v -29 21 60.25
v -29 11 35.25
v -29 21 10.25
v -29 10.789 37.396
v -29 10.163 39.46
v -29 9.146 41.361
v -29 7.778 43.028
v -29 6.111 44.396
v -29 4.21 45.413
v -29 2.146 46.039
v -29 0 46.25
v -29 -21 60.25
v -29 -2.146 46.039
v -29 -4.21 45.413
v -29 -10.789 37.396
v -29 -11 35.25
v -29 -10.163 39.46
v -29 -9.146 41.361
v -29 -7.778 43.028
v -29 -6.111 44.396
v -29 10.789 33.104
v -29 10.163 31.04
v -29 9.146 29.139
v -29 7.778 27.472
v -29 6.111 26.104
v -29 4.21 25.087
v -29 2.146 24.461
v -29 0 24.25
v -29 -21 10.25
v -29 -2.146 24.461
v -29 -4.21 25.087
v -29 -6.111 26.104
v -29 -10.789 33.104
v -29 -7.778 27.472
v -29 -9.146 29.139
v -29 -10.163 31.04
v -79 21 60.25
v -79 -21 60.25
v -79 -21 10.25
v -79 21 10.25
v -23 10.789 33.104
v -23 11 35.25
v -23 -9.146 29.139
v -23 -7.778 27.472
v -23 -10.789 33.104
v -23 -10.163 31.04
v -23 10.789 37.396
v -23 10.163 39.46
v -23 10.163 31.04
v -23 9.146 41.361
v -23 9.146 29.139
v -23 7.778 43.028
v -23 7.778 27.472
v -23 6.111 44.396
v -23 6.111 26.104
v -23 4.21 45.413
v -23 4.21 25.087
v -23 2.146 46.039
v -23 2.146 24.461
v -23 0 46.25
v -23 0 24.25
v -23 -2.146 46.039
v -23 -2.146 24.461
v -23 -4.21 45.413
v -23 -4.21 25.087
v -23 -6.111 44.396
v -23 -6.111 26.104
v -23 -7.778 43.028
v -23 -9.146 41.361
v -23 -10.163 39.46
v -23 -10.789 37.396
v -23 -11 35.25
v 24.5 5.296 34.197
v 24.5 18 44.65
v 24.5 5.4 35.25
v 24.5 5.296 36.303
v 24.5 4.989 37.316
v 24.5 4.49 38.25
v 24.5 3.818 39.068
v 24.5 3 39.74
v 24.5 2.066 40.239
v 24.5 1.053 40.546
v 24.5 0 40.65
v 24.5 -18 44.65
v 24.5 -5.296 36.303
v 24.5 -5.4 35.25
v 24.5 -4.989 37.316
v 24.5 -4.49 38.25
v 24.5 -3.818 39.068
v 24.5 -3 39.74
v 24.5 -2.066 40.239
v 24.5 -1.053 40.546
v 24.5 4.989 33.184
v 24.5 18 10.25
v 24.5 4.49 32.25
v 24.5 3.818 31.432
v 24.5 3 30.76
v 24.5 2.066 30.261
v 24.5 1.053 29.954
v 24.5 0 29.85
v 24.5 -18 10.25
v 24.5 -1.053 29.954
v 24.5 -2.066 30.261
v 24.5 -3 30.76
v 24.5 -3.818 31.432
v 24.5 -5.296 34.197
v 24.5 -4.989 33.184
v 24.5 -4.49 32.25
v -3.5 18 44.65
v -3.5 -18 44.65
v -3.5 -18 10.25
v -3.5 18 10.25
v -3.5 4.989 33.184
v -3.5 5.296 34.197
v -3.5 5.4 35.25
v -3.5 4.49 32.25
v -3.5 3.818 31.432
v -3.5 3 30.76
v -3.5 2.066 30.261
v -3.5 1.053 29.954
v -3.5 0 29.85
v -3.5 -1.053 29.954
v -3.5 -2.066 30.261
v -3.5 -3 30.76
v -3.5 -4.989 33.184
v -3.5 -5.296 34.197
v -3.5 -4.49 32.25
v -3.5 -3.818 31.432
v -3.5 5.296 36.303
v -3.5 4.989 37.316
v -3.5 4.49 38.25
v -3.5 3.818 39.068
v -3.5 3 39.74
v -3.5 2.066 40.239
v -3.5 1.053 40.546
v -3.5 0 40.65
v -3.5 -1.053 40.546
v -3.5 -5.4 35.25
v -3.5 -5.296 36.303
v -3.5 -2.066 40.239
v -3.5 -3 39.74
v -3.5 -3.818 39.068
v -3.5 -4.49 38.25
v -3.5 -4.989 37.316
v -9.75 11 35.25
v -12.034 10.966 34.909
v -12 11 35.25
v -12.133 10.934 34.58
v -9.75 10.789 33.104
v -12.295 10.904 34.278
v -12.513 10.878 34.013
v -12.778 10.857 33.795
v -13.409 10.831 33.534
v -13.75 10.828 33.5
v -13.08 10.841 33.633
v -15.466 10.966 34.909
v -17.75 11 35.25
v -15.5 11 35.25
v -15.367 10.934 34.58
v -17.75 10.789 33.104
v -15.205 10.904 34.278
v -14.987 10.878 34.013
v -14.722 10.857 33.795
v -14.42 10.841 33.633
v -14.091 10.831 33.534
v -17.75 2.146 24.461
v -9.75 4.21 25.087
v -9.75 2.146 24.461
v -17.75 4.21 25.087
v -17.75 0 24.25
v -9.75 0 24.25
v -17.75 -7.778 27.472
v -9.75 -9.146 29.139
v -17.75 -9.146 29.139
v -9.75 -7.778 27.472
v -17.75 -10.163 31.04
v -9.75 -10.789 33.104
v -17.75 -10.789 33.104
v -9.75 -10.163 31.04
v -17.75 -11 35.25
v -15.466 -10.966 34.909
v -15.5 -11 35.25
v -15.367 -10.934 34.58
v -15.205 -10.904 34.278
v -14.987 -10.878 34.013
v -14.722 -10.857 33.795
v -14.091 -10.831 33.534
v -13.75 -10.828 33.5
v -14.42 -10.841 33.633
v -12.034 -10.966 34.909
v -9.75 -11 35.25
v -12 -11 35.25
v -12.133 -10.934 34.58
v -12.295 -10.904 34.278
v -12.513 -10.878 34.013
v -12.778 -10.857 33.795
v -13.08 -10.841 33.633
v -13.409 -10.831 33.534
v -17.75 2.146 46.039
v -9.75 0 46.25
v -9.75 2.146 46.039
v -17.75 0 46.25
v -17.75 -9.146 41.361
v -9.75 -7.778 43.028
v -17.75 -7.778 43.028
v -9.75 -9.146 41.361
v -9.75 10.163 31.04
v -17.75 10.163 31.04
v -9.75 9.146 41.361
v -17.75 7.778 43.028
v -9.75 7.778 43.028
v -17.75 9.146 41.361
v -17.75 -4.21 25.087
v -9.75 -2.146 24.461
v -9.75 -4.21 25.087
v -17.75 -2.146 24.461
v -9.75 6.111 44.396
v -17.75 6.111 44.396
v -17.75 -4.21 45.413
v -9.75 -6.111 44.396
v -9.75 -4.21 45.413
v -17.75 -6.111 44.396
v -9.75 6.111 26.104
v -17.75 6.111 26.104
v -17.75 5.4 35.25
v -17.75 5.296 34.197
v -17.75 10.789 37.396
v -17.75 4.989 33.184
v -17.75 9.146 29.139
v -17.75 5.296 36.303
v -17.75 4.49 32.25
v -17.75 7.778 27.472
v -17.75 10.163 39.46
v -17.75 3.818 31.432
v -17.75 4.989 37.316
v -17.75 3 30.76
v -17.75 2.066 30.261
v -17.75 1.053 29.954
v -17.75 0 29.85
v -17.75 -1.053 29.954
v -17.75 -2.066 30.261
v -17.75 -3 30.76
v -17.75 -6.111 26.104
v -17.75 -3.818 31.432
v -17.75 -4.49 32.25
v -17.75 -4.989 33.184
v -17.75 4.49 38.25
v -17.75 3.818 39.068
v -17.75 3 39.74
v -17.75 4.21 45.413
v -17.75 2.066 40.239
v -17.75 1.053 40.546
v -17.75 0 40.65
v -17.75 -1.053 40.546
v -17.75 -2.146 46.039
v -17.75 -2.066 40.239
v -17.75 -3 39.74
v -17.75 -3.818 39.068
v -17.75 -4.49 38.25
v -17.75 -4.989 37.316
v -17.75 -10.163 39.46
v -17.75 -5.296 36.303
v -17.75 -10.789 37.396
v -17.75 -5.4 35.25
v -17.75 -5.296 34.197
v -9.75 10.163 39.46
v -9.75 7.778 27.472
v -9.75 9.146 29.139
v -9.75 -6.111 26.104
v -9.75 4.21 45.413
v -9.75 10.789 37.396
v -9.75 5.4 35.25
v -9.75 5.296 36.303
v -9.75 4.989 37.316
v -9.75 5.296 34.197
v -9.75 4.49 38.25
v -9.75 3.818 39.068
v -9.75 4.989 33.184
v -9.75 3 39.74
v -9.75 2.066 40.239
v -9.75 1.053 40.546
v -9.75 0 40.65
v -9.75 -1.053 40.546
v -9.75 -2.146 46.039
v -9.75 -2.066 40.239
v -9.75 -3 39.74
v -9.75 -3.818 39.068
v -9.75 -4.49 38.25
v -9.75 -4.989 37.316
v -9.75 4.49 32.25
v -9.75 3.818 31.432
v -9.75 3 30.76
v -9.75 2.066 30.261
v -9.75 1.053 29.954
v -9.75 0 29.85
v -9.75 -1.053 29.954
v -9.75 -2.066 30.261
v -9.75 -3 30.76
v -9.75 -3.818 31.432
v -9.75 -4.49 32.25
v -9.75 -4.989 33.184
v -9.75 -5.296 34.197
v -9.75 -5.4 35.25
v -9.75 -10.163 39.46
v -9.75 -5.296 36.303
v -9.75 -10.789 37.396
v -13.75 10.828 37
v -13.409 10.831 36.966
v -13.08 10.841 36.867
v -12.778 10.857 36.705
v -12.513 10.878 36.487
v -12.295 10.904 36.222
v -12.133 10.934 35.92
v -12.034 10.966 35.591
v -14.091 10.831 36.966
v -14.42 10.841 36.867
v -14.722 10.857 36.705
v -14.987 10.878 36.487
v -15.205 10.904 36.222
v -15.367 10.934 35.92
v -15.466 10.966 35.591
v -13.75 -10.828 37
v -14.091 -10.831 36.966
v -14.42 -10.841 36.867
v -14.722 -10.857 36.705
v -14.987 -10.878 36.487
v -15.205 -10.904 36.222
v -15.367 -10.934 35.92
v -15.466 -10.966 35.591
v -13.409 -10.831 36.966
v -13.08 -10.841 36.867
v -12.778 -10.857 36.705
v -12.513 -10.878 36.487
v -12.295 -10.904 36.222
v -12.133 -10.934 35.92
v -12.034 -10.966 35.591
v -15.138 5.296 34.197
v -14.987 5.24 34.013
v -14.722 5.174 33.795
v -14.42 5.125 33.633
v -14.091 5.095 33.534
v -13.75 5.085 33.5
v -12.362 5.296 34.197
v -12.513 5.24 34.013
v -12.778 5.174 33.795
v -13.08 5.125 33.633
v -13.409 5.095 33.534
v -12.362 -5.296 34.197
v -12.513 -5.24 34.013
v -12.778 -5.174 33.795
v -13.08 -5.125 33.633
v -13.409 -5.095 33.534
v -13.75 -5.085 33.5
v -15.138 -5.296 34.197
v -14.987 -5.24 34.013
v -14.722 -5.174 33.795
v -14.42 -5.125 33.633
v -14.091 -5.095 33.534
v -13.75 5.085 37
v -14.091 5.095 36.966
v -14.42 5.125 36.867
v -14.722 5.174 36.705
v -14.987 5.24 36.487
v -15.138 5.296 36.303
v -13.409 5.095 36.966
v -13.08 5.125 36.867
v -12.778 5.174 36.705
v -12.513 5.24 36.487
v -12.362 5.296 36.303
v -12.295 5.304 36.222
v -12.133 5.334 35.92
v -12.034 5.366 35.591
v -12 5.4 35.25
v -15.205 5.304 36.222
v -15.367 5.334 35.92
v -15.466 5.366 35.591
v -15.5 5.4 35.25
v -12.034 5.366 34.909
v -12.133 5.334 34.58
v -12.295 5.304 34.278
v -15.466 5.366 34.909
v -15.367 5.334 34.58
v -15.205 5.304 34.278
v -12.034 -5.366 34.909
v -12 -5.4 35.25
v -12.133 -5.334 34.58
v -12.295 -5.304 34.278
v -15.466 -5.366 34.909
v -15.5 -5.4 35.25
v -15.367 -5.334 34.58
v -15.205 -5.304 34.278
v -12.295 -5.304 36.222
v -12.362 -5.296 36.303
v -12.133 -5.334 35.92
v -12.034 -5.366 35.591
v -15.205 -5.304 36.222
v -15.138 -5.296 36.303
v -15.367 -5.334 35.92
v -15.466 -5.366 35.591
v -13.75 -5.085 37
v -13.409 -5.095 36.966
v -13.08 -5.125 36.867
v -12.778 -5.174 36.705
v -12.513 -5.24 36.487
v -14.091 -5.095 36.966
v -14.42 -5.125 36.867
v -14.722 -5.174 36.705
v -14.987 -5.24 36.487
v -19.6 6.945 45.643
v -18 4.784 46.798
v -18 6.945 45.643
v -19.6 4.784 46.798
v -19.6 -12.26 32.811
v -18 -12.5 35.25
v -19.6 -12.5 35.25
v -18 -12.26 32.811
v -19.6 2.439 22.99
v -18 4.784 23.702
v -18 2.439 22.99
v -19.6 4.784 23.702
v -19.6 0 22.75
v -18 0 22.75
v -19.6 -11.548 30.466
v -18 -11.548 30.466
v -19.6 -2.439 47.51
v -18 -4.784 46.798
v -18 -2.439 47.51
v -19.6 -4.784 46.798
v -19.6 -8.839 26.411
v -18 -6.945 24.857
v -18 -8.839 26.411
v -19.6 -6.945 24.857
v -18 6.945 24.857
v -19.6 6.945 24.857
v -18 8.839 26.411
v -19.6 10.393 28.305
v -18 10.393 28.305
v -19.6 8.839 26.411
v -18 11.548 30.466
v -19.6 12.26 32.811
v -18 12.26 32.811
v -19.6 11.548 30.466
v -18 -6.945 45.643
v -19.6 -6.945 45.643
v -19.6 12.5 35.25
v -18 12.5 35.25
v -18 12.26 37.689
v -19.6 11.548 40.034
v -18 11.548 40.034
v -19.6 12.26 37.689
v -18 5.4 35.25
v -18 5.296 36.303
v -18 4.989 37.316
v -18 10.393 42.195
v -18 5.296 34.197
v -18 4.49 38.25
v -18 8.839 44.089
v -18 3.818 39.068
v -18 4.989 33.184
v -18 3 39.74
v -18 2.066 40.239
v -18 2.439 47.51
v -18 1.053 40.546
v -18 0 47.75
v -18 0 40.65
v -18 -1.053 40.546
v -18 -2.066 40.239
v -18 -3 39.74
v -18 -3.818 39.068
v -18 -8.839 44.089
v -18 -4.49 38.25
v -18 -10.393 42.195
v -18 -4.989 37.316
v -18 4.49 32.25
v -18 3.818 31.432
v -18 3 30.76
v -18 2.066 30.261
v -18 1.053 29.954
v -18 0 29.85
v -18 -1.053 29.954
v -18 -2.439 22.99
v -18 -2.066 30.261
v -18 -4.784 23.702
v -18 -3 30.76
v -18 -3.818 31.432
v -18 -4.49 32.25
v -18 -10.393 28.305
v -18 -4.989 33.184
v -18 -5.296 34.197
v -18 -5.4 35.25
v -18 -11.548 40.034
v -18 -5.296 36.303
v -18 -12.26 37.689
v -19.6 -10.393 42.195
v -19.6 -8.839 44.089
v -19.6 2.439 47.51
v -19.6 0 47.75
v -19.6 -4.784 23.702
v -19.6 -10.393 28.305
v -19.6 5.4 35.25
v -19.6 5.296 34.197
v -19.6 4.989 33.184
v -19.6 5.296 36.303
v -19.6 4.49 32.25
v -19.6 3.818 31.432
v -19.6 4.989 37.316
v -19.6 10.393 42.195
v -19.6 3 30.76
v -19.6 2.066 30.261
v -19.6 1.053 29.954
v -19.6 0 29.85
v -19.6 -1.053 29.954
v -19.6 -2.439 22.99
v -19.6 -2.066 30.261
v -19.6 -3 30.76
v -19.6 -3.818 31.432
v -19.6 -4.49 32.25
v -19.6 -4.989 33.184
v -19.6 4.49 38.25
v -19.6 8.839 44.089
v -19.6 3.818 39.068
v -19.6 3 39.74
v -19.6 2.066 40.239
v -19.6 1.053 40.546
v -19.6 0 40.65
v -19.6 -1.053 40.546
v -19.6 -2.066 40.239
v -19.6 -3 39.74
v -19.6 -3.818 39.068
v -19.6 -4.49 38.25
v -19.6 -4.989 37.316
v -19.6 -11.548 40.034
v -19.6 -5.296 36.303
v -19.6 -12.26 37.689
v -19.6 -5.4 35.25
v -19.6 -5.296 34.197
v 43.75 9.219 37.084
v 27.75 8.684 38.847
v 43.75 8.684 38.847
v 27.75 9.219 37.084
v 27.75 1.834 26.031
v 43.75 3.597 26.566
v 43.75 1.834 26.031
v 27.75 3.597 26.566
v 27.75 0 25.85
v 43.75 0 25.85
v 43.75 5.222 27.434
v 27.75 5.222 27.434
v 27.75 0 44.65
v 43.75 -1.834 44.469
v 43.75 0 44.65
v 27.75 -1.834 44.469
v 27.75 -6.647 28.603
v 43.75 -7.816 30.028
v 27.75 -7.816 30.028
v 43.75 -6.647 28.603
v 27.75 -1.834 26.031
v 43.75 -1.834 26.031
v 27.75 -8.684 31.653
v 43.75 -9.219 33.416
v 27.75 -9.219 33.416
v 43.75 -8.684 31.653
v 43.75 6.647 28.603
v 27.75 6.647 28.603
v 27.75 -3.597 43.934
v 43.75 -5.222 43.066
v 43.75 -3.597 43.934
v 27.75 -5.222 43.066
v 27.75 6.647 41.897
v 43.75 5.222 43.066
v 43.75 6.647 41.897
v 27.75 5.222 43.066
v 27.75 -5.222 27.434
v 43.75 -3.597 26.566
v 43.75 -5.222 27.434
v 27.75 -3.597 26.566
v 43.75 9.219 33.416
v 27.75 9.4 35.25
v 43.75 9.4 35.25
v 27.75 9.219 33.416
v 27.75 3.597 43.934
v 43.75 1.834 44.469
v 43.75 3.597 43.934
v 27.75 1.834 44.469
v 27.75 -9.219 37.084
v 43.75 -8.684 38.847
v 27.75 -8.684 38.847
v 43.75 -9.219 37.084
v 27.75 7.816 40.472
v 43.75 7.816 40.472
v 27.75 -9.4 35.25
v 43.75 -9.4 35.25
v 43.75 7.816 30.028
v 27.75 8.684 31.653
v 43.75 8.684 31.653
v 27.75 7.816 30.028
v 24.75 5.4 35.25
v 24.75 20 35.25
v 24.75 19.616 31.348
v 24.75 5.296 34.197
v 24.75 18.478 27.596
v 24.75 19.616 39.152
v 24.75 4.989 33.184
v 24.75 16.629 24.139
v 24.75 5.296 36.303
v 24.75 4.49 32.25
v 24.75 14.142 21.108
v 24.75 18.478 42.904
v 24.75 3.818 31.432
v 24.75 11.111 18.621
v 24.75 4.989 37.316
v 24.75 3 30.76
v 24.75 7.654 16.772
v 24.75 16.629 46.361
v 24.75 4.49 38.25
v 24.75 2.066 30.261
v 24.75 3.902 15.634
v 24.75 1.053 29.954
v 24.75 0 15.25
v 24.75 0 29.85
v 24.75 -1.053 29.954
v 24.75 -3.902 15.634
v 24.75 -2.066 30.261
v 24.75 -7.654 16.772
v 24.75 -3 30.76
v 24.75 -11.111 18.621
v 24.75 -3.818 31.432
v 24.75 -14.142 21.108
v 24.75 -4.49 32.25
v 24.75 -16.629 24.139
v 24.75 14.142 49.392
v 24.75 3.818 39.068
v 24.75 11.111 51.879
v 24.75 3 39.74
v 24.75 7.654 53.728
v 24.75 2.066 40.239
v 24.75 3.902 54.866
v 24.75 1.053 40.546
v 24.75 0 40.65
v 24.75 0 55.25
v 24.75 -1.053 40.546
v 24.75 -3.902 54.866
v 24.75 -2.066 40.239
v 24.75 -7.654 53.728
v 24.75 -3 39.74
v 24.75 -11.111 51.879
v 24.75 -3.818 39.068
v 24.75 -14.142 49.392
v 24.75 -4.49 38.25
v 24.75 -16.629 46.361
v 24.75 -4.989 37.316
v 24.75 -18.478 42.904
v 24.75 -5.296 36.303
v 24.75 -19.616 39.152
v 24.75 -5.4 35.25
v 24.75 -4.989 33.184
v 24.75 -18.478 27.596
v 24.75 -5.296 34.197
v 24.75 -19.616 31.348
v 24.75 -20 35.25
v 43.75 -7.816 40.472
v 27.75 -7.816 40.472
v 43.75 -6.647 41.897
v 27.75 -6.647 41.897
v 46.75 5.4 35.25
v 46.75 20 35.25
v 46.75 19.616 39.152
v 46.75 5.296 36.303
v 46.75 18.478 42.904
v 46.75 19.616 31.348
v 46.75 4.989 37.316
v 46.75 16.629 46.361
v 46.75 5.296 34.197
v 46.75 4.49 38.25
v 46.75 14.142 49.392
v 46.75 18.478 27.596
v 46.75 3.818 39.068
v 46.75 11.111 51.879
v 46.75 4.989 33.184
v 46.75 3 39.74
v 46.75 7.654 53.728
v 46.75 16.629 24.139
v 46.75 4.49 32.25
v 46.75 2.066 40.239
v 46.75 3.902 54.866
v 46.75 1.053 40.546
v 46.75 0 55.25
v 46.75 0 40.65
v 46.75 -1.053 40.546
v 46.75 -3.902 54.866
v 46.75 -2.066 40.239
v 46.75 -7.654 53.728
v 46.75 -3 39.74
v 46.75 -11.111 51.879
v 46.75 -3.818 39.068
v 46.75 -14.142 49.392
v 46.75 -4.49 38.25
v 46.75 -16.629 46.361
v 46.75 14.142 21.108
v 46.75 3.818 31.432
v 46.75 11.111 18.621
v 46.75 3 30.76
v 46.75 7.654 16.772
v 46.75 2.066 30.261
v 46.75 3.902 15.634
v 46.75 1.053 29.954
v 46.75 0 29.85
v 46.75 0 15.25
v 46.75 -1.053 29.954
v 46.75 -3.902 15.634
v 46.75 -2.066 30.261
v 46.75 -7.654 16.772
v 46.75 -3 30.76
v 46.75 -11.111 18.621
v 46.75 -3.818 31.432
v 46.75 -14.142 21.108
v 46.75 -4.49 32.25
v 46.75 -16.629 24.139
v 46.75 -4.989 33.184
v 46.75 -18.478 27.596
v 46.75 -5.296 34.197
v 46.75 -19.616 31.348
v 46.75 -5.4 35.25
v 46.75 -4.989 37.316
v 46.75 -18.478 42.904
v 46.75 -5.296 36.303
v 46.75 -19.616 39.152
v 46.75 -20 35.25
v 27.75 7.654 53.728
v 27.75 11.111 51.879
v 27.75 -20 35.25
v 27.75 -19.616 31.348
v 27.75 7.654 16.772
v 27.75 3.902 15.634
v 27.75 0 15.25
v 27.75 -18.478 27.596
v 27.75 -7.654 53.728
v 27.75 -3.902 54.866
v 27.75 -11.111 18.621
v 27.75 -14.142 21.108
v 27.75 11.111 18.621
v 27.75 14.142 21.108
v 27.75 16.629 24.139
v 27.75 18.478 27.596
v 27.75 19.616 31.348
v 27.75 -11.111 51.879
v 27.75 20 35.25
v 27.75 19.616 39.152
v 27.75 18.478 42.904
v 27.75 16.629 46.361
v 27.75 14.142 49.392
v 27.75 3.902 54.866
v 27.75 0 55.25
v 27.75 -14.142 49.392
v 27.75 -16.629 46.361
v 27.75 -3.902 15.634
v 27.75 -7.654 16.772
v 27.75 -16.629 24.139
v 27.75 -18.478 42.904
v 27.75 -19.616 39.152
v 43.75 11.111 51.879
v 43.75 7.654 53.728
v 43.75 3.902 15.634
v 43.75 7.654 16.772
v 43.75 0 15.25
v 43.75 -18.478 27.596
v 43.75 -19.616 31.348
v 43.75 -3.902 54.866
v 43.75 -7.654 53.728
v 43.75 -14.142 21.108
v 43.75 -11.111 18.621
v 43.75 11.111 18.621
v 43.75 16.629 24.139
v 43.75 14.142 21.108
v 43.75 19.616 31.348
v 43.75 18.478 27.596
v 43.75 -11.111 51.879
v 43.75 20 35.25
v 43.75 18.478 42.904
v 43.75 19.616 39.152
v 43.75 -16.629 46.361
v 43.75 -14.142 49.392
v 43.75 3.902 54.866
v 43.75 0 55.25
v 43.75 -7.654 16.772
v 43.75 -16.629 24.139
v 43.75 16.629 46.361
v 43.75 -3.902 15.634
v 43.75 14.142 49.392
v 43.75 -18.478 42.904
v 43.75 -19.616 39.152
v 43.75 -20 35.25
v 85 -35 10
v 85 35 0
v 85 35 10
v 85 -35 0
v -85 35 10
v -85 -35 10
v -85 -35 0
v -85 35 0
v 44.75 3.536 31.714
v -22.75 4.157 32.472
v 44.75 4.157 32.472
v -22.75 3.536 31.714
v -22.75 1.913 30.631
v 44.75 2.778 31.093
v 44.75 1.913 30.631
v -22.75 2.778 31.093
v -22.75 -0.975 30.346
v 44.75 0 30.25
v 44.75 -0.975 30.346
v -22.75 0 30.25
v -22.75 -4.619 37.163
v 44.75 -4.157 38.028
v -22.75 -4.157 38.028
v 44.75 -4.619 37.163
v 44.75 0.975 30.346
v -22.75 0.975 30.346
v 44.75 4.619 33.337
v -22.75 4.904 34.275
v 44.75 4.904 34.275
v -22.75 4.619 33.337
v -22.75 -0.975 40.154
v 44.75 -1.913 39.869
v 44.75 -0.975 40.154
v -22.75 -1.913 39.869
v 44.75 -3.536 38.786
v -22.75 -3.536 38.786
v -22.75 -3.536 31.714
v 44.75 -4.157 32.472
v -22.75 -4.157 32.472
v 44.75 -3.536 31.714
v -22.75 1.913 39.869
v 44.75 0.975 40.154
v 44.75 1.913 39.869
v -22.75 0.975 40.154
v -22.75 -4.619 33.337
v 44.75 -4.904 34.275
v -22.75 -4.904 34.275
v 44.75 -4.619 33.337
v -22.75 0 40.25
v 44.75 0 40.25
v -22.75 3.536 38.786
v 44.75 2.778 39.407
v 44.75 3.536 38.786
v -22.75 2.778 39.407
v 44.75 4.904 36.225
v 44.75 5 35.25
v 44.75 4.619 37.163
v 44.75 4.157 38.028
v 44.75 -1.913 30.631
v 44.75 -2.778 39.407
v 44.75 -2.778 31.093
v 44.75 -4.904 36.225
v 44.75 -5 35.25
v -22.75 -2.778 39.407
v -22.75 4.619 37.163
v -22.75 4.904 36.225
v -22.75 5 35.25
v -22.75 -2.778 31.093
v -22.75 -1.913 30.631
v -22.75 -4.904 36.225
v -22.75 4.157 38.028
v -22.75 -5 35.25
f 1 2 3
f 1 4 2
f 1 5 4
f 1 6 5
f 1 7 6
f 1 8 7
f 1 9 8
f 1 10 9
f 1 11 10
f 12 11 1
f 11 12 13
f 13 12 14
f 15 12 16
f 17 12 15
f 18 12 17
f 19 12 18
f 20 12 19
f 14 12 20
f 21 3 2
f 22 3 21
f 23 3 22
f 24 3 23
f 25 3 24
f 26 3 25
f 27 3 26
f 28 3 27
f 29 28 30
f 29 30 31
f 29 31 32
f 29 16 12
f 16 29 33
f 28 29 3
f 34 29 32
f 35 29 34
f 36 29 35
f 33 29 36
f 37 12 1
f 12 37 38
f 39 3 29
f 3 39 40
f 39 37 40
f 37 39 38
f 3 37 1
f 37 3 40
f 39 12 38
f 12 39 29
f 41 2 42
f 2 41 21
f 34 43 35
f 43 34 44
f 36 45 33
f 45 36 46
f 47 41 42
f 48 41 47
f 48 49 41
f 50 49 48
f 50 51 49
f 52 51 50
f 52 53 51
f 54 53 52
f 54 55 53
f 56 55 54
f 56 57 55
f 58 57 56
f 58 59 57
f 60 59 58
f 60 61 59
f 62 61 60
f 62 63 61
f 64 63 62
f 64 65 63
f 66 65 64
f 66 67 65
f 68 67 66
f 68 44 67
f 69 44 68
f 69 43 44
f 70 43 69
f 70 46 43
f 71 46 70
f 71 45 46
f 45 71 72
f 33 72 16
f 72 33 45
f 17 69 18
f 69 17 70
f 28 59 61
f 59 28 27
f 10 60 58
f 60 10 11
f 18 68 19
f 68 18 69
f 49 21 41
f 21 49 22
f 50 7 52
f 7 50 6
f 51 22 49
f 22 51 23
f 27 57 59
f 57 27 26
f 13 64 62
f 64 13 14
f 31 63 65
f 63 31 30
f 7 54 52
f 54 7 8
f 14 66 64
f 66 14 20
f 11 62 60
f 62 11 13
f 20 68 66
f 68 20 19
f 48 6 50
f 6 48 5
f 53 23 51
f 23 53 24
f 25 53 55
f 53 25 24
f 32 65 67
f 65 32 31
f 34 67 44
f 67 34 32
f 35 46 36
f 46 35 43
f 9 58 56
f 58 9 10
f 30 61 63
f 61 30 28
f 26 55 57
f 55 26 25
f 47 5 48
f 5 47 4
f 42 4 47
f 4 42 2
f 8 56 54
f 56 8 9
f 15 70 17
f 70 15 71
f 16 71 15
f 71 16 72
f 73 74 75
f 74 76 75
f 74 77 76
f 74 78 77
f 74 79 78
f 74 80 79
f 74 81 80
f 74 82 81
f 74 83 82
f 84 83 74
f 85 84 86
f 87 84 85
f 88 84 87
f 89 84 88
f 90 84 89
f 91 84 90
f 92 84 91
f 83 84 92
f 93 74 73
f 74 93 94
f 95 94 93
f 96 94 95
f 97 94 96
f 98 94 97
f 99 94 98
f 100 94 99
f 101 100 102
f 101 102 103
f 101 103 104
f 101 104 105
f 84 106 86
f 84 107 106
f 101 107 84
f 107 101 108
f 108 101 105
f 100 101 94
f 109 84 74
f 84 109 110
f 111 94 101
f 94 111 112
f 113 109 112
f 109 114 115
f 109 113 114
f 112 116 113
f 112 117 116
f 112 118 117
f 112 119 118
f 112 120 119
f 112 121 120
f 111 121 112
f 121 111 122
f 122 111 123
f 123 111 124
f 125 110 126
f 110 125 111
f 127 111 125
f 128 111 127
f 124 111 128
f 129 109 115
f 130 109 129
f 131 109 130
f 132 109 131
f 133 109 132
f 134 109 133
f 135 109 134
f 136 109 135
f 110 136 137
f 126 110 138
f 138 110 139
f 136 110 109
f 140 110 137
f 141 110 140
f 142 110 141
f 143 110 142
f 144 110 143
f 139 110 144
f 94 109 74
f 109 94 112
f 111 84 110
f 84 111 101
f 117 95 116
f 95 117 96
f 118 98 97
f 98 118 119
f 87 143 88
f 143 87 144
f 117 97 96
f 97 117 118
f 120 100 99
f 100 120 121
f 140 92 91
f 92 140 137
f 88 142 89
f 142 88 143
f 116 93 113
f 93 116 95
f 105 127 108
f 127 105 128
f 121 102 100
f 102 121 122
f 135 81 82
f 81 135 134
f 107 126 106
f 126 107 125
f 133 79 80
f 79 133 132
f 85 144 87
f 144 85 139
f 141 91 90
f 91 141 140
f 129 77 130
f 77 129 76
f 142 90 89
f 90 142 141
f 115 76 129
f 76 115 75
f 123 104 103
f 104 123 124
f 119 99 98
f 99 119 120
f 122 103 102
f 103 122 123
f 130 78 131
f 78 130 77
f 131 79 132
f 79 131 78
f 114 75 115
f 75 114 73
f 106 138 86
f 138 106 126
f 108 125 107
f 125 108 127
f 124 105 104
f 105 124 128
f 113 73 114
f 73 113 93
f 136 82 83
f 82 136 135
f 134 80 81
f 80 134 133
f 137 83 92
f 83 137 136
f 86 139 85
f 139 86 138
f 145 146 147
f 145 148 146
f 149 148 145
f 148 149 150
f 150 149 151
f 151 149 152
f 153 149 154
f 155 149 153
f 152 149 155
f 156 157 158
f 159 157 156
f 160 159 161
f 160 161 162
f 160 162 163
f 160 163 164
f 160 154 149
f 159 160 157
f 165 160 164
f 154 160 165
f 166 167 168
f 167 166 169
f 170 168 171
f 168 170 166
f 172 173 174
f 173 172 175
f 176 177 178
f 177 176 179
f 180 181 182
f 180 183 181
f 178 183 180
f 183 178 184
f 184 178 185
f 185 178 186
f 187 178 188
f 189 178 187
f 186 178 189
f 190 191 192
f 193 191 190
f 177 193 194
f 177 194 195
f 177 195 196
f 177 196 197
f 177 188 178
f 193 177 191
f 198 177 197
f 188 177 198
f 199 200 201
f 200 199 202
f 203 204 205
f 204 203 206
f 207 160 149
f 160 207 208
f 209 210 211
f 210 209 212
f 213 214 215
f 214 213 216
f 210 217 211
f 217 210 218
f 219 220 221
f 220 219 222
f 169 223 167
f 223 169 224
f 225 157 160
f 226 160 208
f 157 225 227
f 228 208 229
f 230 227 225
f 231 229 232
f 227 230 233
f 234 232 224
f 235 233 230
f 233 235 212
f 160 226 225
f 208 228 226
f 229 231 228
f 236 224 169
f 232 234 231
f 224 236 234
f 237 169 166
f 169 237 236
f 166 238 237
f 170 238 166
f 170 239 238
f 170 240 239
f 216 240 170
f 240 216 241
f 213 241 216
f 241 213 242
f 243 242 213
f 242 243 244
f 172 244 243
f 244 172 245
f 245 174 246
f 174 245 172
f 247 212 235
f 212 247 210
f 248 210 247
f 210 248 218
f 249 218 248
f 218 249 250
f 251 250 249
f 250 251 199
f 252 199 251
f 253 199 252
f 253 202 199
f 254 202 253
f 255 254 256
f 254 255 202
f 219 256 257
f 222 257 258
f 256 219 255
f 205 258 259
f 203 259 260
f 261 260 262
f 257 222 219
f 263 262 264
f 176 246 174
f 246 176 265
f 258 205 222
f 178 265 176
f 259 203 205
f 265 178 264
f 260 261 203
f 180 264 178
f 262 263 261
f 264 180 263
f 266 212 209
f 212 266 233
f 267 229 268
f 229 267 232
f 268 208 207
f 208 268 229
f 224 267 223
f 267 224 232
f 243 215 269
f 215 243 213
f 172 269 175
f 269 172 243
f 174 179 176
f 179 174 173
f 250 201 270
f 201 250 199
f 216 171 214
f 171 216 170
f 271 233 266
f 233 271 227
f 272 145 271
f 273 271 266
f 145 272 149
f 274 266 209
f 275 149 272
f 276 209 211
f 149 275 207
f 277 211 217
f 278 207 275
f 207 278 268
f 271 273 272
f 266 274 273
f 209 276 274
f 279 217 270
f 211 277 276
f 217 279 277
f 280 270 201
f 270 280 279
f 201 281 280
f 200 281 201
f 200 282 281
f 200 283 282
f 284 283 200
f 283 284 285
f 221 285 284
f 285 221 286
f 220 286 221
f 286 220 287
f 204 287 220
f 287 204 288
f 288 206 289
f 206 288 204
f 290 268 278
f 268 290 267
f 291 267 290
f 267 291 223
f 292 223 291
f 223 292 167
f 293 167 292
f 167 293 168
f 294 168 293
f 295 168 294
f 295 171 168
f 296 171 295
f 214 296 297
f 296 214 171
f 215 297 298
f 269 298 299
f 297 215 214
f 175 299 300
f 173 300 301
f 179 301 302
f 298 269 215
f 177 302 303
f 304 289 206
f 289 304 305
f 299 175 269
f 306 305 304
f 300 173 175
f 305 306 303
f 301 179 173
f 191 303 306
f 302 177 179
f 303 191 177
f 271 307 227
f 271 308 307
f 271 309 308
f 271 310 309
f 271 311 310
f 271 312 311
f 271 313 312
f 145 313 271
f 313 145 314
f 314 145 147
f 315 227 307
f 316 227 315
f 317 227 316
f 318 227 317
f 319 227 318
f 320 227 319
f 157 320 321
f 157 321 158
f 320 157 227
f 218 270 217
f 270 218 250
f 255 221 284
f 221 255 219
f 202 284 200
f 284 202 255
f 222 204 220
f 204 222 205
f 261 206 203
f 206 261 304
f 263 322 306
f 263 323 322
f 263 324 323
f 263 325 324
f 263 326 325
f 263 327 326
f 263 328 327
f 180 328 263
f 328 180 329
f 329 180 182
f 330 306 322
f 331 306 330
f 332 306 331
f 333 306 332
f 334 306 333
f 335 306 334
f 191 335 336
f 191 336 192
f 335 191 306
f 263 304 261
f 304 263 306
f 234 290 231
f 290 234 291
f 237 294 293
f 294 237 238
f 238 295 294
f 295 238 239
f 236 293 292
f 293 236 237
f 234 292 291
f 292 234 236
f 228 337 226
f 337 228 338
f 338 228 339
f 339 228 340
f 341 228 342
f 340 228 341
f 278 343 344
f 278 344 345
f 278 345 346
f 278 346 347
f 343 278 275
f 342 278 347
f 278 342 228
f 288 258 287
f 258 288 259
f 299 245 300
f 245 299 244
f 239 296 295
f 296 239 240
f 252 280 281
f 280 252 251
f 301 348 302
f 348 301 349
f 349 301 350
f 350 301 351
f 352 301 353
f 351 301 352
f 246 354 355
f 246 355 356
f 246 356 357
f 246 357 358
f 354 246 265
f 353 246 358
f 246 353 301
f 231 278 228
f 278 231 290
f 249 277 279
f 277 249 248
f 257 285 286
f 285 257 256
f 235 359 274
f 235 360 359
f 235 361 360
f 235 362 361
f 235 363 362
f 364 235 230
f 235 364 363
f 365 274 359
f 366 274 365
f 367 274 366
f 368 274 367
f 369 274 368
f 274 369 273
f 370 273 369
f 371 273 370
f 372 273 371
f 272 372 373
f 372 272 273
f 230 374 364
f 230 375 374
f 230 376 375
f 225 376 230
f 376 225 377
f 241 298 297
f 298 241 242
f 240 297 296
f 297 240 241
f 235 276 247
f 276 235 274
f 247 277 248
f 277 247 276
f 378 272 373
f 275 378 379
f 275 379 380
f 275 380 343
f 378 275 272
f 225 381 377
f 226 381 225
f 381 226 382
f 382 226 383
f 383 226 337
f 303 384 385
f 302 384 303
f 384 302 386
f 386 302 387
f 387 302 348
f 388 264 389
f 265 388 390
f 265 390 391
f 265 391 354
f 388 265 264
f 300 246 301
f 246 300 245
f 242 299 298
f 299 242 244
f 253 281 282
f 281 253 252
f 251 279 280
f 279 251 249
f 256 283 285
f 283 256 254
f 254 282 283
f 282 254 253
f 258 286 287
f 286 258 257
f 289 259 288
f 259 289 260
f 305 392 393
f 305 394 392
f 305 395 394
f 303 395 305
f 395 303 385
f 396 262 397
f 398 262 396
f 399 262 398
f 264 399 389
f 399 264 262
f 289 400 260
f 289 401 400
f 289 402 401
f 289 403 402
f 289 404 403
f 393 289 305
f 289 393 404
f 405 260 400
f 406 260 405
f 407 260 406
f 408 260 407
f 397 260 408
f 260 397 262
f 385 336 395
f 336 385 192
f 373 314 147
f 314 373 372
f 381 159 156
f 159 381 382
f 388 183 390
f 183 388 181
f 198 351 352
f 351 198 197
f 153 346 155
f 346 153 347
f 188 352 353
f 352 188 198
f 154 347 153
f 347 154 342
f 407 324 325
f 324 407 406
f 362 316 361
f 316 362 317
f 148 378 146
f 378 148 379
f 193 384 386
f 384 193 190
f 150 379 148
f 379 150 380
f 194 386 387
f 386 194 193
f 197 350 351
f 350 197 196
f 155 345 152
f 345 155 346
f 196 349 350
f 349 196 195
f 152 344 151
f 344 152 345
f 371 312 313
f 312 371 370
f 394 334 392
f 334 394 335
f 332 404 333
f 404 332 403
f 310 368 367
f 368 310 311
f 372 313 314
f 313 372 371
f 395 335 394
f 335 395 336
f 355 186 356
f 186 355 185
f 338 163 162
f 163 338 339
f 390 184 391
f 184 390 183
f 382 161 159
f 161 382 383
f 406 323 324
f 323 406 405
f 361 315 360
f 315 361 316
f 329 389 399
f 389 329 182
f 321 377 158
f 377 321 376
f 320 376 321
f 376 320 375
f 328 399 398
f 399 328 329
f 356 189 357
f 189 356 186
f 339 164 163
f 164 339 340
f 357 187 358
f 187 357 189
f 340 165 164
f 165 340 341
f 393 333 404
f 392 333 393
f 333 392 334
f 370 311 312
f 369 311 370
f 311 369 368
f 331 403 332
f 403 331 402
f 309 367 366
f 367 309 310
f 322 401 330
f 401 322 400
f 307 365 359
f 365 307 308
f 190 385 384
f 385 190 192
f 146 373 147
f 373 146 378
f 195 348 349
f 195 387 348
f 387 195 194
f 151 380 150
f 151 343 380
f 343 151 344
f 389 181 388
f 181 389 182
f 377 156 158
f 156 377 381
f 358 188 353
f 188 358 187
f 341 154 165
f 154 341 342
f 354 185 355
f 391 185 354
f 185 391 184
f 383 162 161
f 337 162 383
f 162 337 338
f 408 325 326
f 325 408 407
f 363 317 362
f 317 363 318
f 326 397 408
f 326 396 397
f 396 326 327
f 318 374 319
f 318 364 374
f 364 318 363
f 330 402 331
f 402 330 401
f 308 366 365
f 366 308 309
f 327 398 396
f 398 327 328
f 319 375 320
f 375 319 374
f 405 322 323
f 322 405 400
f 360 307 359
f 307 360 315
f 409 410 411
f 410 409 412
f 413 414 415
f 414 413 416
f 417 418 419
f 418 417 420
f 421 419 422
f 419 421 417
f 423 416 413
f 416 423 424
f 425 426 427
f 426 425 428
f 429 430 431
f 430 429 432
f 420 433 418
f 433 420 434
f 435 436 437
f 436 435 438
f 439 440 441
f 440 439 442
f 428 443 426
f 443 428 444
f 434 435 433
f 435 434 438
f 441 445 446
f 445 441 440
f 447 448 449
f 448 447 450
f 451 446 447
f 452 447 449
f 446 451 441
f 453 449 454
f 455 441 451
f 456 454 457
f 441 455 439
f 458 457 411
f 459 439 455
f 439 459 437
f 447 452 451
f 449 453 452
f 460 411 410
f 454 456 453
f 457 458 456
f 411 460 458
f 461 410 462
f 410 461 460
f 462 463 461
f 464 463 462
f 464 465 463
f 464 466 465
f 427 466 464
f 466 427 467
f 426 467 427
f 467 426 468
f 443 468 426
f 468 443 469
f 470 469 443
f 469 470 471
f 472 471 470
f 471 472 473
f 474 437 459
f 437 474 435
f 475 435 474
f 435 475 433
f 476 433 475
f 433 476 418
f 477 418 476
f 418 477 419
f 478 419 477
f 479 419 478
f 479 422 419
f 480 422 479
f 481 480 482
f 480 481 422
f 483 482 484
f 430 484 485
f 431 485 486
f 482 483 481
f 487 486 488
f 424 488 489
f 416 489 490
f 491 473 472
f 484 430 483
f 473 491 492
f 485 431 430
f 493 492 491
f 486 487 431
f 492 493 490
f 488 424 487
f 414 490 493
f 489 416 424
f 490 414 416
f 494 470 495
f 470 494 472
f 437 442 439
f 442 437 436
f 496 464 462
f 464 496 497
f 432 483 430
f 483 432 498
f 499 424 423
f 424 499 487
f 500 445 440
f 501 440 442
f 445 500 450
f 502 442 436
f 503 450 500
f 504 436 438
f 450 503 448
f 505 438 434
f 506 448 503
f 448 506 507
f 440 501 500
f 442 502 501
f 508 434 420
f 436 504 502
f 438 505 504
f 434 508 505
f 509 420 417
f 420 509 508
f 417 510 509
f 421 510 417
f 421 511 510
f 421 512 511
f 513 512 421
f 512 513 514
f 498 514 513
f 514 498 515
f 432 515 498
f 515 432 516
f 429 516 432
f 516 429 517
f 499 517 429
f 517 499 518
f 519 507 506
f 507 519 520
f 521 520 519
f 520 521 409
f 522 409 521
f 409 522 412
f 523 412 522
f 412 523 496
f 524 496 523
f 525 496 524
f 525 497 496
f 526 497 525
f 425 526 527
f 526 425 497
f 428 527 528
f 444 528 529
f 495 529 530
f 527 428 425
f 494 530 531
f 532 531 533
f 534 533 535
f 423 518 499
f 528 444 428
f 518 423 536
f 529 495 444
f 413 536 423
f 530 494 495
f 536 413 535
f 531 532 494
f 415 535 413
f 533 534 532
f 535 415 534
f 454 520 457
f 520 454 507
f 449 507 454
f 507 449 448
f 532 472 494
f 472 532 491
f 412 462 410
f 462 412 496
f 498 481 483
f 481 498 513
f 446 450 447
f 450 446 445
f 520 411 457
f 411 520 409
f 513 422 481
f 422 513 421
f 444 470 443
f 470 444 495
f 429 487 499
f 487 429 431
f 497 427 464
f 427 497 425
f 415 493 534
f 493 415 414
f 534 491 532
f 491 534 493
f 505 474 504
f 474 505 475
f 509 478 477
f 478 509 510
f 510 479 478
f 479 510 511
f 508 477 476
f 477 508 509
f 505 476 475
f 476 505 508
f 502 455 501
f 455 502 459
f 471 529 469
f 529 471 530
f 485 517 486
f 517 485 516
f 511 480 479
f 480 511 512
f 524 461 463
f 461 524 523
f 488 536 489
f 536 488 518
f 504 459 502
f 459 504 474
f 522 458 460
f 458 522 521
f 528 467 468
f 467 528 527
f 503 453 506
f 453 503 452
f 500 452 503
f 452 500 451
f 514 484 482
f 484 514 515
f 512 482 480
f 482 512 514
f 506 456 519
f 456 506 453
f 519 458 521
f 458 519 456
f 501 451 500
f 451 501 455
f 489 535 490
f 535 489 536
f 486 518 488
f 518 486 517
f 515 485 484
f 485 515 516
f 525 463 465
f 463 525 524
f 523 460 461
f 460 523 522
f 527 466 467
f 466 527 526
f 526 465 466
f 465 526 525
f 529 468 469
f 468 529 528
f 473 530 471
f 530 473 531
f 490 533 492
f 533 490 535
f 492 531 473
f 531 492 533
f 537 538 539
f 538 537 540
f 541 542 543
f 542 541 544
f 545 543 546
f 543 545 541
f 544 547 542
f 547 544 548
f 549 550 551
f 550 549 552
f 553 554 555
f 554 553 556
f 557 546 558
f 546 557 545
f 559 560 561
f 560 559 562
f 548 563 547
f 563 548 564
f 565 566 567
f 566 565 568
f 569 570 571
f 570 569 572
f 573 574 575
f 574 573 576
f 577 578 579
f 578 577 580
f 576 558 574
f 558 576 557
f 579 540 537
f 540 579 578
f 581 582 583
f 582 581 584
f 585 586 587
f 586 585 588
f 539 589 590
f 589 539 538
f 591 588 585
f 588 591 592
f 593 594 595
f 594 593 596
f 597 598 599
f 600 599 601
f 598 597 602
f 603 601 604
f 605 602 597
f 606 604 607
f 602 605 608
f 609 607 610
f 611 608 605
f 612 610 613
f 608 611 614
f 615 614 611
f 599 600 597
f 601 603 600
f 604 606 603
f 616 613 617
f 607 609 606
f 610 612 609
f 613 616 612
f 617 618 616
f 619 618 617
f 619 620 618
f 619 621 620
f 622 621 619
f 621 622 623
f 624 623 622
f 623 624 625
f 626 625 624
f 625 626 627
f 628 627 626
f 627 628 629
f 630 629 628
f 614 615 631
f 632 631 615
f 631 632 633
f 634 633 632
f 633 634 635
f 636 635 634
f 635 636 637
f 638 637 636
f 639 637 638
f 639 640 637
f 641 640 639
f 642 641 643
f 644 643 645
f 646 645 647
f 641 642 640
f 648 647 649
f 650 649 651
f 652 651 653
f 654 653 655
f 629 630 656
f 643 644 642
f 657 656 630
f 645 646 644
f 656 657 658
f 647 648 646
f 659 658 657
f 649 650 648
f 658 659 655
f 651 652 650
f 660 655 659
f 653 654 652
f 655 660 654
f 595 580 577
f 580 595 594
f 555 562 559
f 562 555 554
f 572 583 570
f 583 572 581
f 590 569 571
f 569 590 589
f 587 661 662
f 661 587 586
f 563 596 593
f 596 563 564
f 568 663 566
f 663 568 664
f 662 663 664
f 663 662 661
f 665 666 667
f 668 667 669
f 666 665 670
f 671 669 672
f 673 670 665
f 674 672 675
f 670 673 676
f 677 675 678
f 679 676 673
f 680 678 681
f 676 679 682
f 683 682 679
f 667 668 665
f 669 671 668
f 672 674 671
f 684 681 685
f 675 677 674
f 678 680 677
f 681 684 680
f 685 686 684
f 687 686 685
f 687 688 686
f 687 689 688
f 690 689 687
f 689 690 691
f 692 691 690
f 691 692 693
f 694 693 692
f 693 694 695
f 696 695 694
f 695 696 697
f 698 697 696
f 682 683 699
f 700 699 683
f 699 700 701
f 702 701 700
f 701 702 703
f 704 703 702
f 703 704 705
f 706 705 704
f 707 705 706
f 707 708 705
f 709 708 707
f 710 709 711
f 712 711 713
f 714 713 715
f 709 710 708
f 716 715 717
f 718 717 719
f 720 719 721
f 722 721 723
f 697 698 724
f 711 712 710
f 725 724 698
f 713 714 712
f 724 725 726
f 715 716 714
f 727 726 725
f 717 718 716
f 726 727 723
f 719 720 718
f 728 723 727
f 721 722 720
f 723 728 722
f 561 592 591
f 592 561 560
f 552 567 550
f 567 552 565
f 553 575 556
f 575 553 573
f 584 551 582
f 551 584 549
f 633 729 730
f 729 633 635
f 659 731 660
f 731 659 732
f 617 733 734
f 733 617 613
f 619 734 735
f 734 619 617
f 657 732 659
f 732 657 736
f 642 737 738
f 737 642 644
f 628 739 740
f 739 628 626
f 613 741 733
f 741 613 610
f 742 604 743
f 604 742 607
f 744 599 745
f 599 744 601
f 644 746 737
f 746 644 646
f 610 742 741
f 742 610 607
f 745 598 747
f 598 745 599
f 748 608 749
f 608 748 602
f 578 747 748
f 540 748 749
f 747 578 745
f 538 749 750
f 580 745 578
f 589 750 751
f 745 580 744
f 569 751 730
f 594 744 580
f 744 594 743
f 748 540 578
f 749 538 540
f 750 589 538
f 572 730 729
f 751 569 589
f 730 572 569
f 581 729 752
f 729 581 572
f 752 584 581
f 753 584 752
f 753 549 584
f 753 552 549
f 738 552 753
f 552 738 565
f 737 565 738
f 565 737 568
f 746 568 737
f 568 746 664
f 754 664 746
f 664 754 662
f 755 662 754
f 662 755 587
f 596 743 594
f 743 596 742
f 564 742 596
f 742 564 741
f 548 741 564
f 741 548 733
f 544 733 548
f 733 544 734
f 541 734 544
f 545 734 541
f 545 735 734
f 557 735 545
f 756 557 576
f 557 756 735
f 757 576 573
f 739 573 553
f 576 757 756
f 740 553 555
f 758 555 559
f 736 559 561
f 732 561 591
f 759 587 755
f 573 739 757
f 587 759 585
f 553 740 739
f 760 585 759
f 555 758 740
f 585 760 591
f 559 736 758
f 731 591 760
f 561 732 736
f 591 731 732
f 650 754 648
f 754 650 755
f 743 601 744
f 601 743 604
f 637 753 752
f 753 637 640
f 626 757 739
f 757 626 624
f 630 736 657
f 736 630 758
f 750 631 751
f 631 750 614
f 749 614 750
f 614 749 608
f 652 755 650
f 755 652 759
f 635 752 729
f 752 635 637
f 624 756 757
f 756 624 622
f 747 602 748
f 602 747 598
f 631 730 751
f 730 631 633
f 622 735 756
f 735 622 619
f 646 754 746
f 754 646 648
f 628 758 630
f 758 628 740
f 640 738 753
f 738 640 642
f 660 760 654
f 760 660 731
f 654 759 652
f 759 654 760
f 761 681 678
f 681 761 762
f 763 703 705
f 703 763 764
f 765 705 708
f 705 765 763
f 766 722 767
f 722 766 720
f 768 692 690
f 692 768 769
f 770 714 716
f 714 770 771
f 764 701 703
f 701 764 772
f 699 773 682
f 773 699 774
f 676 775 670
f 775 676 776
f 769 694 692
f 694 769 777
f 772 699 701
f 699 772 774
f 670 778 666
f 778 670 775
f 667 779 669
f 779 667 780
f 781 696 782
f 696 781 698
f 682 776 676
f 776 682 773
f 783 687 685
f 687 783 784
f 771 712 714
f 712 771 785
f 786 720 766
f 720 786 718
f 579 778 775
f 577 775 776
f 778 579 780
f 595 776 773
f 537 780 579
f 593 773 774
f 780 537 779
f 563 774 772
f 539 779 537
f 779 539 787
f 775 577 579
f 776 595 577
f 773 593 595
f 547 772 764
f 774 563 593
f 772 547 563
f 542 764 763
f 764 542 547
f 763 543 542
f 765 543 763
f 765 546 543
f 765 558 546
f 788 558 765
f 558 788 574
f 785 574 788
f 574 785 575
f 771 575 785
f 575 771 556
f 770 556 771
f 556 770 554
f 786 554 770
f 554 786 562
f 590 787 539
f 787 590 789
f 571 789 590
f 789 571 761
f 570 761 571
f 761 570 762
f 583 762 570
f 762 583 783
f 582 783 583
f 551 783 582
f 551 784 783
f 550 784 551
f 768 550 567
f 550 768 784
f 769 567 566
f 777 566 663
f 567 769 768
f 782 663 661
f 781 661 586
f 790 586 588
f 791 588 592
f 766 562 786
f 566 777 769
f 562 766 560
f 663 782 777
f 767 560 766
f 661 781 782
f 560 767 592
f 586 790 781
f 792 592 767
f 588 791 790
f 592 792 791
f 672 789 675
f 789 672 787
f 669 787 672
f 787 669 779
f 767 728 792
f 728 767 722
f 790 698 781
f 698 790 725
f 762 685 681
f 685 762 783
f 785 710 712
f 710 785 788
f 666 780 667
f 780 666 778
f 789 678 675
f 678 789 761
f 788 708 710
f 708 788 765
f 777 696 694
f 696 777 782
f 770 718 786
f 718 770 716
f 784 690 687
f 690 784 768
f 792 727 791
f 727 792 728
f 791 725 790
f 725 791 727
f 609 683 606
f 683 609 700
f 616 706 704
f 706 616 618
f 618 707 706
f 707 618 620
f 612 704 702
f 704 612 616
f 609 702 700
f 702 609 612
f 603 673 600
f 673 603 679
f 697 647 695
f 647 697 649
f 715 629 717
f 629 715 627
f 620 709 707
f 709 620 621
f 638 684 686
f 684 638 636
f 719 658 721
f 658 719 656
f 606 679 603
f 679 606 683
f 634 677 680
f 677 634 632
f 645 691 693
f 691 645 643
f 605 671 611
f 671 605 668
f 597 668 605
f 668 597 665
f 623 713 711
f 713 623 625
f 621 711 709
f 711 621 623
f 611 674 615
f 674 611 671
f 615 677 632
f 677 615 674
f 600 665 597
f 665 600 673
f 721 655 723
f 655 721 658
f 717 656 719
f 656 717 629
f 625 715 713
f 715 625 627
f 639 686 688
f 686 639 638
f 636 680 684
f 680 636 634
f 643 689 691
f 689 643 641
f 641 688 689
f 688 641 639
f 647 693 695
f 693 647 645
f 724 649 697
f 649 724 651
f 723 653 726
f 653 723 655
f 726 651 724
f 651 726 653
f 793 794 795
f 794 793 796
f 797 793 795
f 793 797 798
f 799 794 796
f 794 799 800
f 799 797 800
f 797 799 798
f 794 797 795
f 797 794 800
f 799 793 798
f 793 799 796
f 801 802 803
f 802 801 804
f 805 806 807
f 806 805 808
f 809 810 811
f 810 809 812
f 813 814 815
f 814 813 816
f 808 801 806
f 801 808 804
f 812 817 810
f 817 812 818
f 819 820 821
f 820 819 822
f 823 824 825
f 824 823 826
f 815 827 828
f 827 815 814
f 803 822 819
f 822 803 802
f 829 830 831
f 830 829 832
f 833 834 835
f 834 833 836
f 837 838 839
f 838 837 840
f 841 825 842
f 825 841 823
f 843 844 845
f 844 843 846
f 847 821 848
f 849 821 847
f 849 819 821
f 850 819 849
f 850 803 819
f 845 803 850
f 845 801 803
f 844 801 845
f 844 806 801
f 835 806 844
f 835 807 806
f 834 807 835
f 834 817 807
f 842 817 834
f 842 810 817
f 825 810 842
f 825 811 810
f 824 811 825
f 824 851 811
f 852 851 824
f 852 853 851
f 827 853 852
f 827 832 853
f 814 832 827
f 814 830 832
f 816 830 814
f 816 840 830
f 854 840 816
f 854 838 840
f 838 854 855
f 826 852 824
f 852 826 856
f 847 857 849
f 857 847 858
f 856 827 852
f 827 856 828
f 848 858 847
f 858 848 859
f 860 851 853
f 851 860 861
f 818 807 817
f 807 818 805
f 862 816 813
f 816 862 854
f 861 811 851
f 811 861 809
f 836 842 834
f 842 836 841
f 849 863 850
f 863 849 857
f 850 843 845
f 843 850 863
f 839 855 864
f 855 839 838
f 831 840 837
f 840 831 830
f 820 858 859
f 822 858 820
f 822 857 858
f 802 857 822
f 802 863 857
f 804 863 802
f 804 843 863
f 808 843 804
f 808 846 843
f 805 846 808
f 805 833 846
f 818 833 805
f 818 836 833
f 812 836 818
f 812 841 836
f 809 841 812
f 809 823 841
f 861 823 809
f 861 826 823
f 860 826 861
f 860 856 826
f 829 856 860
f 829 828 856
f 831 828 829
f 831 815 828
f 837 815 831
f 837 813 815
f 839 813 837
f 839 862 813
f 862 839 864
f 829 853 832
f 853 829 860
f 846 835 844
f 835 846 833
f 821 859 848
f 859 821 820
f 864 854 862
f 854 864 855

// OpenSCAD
$fn = 32;

// ------------------------------------------------------------------------
// Motor drive station: motor 50 x 50 mm, shaft d10, pulley d40
// Every part is its own module, assembly() places every instance.
// ------------------------------------------------------------------------

// --- part 1 ---
module station_bed() {
  difference() {
    translate([-85, -35, 0]) cube([170, 70, 10]);
  }
}

// --- part 2 ---
module drive_motor() {
  union() {
    translate([-25, -21, 0]) cube([50, 42, 50]);
    translate([28, 0, 25]) rotate([0, 90, 0]) cylinder(h = 6, d = 22, center = true);
  }
}

// --- part 3 ---
module pillow_block() {
  difference() {
    translate([-14, -18, 0]) cube([28, 36, 34.4]);
    translate([0, 0, 25]) rotate([0, 90, 0]) cylinder(h = 30, d = 10.8, center = true);
  }
}

// --- part 4 ---
module drive_shaft() {
  translate([0, 0, -33.75]) cylinder(h = 67.5, d = 10);
}

// --- part 5 ---
module shaft_collar() {
  difference() {
    cylinder(h = 8, d = 22);
    translate([0, 0, -1]) cylinder(h = 10, d = 10.8);
    translate([0, 0, 4]) rotate([90, 0, 0]) cylinder(h = 24, d = 3.5, center = true);
  }
}

// --- part 6 ---
module collar_washer() {
  difference() {
      translate([0, 0, 0]) cylinder(h = 1.6, d = 25);
      translate([0, 0, -1]) cylinder(h = 3.6, d = 10.8);
    }
}

// --- part 7 ---
module drive_pulley() {
  difference() {
    union() {
      cylinder(h = 22, d = 18.8);
      cylinder(h = 3, d = 40);
      translate([0, 0, 19]) cylinder(h = 3, d = 40);
    }
    translate([0, 0, -1]) cylinder(h = 24, d = 10.8);
  }
}

// --- assembly ---
module assembly() {
  color([0.80, 0.24, 0.20]) translate([0, 0, 0]) rotate([0, 0, 0]) station_bed();
  color([0.20, 0.45, 0.75]) translate([-54, 0, 10.25]) rotate([0, 0, 0]) drive_motor();
  color([0.25, 0.62, 0.32]) translate([10.5, 0, 10.25]) rotate([0, 0, 0]) pillow_block();
  color([0.92, 0.70, 0.18]) translate([11, 0, 35.25]) rotate([0, 90, 0]) drive_shaft();
  color([0.58, 0.35, 0.70]) translate([-17.75, 0, 35.25]) rotate([0, 90, 0]) shaft_collar();
  color([0.16, 0.66, 0.66]) translate([-19.6, 0, 35.25]) rotate([0, 90, 0]) collar_washer();
  color([0.85, 0.48, 0.18]) translate([24.75, 0, 35.25]) rotate([0, 90, 0]) drive_pulley();
}

assembly();
